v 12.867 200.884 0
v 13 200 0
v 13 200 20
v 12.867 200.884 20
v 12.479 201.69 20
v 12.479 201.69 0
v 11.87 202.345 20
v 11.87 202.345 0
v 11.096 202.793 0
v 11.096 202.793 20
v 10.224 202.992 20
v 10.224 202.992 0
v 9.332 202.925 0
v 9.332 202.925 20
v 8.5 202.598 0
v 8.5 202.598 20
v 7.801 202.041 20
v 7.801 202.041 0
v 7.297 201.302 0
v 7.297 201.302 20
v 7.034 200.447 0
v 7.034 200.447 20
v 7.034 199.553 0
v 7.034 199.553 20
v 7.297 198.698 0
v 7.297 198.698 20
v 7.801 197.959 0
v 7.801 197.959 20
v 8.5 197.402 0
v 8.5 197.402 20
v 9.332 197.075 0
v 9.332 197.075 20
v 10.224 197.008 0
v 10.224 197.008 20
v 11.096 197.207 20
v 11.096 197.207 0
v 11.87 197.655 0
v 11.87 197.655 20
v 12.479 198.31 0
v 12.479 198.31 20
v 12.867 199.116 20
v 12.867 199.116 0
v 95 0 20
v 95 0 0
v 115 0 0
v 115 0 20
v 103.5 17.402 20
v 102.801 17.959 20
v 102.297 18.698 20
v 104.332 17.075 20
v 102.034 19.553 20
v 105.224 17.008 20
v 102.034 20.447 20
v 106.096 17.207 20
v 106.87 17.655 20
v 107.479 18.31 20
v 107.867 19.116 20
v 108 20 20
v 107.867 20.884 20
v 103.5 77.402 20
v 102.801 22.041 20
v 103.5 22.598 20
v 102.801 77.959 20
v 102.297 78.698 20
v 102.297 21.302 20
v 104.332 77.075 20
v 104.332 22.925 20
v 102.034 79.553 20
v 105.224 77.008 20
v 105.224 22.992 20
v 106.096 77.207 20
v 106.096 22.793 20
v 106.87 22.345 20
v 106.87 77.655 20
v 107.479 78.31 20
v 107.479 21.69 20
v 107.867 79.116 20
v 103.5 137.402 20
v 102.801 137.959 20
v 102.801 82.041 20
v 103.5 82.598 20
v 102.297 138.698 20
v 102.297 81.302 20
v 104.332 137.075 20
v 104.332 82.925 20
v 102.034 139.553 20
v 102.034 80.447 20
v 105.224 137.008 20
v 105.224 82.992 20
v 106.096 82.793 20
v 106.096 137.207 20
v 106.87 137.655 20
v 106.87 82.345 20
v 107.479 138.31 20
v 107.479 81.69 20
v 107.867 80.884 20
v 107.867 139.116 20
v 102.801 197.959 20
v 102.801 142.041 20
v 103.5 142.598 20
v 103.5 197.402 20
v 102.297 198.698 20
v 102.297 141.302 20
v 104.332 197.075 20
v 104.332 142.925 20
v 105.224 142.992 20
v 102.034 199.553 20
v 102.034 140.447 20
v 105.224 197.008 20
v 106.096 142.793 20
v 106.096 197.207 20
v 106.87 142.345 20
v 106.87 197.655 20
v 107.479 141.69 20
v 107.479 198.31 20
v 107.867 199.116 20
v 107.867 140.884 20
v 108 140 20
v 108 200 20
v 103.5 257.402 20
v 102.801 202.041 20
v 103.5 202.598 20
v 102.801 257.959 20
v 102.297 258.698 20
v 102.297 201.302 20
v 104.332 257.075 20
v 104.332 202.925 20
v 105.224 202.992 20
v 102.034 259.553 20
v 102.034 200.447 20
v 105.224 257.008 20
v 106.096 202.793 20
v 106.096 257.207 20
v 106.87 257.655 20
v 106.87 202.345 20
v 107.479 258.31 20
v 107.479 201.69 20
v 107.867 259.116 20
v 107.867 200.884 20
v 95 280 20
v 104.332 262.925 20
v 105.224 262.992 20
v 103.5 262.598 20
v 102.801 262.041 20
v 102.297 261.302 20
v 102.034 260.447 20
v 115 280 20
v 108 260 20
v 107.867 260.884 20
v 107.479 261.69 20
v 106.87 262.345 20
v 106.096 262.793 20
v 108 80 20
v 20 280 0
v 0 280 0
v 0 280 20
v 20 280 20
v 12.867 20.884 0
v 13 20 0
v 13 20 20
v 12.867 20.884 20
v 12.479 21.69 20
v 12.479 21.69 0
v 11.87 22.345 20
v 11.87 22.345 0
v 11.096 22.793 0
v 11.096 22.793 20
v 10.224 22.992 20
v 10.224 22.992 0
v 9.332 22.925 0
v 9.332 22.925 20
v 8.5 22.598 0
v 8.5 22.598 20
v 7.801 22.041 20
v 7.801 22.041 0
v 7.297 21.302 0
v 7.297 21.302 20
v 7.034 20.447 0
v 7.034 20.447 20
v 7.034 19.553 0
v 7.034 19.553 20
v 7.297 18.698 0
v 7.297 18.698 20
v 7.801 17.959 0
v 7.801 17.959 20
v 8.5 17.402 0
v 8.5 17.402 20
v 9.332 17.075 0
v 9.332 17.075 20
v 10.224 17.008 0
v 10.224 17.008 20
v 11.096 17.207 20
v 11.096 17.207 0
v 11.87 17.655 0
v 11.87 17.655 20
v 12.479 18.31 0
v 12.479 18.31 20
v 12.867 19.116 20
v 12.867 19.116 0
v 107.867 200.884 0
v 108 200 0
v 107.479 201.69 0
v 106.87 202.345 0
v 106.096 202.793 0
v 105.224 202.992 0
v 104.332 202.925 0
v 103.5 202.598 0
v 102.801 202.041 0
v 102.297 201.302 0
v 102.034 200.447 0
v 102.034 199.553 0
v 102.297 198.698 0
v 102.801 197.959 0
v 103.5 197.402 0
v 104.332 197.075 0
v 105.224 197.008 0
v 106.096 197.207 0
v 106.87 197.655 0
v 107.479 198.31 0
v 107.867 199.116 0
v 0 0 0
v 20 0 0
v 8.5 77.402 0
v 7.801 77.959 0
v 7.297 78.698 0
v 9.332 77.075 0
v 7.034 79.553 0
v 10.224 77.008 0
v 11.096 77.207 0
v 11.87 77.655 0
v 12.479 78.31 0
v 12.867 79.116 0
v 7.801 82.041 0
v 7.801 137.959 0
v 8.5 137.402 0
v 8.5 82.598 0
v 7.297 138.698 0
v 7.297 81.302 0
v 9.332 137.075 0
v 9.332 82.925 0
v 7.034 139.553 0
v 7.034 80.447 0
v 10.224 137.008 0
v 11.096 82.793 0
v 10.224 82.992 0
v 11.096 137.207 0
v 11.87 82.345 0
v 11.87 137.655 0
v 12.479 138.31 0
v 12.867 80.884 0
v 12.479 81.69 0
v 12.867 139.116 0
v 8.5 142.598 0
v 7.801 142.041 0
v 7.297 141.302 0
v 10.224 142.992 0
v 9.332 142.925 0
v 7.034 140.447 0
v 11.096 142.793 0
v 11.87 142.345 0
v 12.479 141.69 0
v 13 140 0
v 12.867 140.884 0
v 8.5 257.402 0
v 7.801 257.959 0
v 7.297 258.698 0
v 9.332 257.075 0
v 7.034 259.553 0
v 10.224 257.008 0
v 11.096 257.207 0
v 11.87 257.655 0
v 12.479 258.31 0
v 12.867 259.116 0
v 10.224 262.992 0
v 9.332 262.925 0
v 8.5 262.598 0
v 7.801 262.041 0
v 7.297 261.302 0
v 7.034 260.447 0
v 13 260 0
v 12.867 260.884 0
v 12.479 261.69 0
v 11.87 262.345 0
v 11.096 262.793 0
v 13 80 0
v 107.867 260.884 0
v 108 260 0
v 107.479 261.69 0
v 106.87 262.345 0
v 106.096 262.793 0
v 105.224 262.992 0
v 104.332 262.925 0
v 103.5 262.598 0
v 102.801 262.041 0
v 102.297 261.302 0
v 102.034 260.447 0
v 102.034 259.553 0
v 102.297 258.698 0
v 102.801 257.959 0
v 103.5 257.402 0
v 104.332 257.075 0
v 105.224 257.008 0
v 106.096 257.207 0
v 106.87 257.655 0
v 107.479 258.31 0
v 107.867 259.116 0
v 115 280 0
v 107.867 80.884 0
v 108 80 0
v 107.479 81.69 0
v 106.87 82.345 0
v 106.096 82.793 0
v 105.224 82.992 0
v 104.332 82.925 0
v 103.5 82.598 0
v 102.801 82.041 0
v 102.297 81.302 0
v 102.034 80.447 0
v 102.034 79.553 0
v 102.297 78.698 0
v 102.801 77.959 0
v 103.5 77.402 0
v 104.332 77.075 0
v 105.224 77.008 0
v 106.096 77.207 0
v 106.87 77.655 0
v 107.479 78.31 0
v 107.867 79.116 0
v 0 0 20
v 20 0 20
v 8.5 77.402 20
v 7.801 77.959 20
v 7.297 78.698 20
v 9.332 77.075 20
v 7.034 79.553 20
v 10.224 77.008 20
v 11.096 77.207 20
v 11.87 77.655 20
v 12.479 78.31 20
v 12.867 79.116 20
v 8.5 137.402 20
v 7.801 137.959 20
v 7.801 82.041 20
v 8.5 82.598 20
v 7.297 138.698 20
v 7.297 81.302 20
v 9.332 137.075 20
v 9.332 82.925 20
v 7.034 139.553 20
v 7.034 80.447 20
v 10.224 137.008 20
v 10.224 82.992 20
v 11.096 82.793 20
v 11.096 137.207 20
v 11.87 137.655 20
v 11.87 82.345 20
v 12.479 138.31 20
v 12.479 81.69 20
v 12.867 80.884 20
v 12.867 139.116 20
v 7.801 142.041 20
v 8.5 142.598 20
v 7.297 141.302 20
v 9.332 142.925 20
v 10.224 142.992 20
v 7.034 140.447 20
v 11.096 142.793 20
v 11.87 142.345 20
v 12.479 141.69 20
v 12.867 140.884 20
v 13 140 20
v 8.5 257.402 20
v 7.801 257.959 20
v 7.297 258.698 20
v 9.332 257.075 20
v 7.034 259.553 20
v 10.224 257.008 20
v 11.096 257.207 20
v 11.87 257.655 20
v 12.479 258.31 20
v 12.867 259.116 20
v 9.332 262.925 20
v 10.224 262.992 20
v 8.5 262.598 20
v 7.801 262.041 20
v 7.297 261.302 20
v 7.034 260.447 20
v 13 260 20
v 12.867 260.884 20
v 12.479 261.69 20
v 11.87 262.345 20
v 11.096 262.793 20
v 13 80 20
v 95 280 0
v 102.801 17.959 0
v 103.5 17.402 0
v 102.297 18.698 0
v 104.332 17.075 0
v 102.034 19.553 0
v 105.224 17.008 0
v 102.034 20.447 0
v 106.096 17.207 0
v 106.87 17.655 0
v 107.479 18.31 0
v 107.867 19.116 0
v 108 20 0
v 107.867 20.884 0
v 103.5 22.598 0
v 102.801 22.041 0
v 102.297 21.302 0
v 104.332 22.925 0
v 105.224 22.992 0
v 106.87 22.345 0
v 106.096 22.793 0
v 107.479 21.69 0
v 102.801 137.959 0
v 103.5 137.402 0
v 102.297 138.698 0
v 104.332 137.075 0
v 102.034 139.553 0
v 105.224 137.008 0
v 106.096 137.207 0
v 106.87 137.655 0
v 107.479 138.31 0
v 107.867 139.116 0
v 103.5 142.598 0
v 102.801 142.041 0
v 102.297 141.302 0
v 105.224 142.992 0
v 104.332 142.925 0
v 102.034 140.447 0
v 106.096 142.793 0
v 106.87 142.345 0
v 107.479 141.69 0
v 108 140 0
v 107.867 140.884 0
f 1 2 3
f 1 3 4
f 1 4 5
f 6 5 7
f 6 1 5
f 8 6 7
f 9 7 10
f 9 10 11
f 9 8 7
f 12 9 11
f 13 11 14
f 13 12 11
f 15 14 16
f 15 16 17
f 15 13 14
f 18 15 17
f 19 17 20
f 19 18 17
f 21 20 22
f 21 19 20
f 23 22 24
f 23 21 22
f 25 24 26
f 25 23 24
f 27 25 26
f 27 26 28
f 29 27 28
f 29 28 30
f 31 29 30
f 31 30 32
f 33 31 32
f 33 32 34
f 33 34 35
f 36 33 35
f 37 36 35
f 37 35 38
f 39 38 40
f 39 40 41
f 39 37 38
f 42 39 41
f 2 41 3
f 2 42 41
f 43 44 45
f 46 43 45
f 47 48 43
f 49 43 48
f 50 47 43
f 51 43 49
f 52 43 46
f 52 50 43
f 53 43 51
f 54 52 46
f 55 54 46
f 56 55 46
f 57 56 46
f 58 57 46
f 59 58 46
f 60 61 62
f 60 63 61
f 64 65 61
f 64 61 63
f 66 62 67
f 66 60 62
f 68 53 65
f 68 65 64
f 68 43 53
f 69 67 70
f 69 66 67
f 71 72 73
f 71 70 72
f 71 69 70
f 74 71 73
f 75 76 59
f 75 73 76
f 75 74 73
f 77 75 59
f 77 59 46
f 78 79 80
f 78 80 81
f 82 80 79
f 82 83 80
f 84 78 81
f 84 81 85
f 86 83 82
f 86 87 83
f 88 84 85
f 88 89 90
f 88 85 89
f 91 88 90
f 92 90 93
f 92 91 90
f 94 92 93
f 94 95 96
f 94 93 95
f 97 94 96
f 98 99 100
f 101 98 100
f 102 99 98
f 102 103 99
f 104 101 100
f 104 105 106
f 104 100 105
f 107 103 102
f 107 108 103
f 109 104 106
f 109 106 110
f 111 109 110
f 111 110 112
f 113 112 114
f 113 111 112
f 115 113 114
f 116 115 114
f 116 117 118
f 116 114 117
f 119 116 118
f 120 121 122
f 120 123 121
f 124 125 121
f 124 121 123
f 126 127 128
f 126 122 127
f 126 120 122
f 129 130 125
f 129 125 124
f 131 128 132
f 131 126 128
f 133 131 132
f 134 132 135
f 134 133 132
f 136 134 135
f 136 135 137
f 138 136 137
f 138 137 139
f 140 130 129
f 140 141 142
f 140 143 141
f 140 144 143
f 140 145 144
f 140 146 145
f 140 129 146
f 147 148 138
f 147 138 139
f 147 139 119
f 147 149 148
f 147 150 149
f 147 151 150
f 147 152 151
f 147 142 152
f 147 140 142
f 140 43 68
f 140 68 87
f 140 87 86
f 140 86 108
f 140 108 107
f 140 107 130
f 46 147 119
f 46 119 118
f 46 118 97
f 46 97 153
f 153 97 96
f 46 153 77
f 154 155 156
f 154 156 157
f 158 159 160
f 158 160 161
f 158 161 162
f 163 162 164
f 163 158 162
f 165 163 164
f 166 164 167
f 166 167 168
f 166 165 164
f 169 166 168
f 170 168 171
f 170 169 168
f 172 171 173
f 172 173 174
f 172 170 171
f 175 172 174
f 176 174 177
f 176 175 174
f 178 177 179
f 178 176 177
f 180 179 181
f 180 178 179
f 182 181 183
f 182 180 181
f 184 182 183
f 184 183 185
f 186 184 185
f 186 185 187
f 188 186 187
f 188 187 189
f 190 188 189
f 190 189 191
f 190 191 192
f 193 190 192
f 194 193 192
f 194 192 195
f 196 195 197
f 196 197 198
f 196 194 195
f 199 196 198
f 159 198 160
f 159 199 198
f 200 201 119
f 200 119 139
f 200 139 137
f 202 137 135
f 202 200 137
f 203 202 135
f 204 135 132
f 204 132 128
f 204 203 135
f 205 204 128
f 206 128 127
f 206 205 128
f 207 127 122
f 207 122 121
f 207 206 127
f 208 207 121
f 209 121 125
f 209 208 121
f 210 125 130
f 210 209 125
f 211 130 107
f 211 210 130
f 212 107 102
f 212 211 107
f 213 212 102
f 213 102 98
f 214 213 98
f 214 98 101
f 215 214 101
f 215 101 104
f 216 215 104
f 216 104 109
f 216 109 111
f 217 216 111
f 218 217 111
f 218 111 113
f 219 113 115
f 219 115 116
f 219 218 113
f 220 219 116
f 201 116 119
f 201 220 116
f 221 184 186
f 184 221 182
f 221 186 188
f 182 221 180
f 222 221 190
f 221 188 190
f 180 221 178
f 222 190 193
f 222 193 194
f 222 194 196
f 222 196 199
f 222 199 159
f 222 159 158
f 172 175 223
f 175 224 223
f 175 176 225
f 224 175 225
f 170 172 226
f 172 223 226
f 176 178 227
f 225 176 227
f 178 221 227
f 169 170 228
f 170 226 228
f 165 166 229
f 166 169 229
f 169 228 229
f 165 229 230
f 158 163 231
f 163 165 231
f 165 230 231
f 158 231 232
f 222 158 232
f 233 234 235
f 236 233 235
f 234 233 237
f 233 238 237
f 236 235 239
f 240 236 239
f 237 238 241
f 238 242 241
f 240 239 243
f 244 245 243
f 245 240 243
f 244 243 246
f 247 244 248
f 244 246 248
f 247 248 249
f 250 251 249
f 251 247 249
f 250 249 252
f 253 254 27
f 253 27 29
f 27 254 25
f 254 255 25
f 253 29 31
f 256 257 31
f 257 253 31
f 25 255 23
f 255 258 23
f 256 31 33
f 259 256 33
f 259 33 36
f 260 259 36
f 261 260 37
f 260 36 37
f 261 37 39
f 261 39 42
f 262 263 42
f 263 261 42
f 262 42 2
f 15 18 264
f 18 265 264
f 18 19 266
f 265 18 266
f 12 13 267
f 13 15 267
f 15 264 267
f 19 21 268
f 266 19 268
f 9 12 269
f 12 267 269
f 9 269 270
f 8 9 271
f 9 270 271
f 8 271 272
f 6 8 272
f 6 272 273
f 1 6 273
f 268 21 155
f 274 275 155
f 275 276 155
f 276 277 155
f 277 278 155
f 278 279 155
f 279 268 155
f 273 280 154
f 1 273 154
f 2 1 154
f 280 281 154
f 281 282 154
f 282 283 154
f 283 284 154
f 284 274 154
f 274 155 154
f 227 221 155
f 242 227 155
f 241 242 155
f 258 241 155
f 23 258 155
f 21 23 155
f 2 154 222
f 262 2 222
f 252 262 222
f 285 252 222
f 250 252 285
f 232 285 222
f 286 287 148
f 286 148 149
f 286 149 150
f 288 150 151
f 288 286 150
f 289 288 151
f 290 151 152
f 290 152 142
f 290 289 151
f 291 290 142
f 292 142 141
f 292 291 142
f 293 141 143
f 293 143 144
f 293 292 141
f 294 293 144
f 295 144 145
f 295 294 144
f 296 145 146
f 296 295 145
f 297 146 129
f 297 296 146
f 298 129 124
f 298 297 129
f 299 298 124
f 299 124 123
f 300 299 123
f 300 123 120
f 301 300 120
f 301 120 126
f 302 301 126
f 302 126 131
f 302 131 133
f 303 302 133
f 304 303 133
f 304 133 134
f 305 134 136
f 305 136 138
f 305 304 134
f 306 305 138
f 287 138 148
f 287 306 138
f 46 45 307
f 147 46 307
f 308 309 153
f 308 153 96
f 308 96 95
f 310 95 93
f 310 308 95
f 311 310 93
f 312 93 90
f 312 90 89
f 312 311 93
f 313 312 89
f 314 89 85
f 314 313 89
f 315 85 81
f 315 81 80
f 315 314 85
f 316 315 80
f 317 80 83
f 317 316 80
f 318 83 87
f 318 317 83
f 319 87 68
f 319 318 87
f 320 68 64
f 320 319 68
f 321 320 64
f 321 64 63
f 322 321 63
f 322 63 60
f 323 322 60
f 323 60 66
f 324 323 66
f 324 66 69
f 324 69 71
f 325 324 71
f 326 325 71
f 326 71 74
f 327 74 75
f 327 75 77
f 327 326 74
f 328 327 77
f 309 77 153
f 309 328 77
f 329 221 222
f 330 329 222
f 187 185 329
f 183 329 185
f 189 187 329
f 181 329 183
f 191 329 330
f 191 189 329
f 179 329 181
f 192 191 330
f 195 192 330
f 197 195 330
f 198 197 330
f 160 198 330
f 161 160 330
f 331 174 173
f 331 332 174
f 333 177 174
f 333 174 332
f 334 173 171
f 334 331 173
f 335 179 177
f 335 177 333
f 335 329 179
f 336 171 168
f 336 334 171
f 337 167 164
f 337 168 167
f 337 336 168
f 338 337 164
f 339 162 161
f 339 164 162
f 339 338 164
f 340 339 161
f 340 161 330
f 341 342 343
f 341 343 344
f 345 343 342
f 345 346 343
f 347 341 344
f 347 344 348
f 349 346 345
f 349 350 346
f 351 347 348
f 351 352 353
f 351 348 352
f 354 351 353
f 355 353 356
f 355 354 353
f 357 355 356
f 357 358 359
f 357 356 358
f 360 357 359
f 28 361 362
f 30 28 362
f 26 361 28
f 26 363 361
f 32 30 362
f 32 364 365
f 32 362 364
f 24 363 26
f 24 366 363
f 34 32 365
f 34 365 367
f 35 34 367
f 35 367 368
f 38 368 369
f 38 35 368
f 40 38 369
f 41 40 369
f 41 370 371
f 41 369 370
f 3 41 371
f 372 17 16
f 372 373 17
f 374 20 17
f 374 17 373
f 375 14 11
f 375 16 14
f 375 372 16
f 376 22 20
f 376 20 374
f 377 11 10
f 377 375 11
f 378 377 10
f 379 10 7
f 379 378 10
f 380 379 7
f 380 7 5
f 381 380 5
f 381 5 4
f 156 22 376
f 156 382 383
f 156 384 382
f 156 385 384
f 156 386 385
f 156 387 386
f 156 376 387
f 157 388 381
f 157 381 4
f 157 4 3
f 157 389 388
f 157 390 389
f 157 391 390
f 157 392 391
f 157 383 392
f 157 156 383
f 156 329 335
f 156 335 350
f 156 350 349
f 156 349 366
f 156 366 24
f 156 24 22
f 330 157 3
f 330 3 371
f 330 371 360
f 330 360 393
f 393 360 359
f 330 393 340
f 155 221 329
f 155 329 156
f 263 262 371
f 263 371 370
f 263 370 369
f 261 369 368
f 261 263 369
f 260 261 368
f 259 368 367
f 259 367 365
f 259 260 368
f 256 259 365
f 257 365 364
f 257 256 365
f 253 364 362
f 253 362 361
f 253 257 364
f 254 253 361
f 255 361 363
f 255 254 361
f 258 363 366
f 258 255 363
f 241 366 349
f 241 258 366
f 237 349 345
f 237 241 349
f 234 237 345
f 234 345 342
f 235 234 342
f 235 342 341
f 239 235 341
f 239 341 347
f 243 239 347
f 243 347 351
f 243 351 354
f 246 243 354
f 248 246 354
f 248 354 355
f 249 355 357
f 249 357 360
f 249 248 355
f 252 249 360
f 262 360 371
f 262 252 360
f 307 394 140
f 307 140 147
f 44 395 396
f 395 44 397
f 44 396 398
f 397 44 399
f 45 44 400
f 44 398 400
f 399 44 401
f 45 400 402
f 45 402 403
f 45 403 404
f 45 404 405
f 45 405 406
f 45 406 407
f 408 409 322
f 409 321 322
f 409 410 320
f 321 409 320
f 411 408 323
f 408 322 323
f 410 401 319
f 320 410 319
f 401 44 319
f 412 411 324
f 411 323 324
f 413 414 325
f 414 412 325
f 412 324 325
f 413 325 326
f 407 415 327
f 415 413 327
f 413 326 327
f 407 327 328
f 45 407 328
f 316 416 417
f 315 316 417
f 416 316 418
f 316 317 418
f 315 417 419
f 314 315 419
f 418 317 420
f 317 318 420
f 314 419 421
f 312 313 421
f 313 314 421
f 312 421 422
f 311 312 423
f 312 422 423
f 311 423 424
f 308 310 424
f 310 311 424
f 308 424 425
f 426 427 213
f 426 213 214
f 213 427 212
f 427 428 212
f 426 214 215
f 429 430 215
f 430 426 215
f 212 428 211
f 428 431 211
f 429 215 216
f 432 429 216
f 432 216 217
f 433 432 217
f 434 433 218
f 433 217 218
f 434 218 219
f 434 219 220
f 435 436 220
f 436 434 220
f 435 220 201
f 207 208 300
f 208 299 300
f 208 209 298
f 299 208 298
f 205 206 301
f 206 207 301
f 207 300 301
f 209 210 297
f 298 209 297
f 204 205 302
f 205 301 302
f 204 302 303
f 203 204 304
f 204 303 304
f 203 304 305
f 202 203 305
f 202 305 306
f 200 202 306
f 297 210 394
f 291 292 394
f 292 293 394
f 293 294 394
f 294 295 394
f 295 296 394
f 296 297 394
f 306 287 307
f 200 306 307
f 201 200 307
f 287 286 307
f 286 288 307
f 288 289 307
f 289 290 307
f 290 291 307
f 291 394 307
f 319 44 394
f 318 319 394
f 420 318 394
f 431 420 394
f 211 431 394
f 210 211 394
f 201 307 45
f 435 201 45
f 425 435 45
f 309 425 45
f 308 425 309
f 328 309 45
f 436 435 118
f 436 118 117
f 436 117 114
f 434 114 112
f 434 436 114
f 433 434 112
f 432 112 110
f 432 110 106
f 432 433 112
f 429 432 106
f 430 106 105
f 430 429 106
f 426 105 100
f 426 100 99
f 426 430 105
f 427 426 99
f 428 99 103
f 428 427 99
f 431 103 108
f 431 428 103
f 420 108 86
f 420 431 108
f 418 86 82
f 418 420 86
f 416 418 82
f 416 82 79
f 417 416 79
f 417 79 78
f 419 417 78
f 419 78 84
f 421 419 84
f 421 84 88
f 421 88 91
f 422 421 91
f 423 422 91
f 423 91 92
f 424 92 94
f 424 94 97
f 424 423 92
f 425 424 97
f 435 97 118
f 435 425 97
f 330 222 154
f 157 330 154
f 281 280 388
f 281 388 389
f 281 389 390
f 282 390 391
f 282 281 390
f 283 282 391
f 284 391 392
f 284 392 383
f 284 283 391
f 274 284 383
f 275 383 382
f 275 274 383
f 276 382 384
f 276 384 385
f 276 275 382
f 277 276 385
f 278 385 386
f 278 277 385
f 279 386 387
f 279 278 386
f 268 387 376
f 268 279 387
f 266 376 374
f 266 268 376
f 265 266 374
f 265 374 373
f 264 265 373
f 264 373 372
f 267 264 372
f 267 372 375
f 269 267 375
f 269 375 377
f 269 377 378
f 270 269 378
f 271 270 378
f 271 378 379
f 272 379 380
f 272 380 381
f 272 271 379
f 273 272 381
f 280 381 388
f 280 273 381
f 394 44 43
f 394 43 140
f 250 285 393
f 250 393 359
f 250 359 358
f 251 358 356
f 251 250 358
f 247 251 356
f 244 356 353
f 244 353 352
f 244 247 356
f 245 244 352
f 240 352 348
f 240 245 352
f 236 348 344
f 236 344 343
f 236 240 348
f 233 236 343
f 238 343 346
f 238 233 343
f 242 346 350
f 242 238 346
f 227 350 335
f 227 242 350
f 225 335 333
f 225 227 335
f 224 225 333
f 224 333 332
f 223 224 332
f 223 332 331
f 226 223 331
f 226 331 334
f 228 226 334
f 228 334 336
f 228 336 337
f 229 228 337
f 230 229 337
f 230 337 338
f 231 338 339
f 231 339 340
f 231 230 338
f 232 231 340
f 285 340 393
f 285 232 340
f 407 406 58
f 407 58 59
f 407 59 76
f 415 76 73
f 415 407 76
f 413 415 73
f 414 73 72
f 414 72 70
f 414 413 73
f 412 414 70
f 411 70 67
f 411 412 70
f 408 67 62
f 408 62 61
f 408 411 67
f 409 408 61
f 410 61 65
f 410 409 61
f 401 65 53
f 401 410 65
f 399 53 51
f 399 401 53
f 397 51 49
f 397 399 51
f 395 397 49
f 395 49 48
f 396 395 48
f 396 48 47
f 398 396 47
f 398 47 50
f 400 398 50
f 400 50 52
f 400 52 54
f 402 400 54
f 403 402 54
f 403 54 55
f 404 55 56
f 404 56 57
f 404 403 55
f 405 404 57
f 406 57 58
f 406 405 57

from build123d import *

# Parameters (mm, degrees)
F0_W     = 20
F0_H     = 280
F0_R     = 3
F1_DEPTH = 20


with BuildPart() as f1:
    # F0 (on Top) → F1 (new body)
    with BuildSketch(Plane.XY):
        with Locations((10, 140)):
            Rectangle(F0_W, F0_H)
        with Locations((10, 20)):
            Circle(F0_R, mode=Mode.SUBTRACT)
        with Locations((10, 80)):
            Circle(F0_R, mode=Mode.SUBTRACT)
        with Locations((10, 140)):
            Circle(F0_R, mode=Mode.SUBTRACT)
        with Locations((10, 200)):
            Circle(F0_R, mode=Mode.SUBTRACT)
        with Locations((10, 260)):
            Circle(F0_R, mode=Mode.SUBTRACT)
        with Locations((105, 140)):
            Rectangle(F0_W, F0_H)
        with Locations((105, 20)):
            Circle(F0_R, mode=Mode.SUBTRACT)
        with Locations((105, 80)):
            Circle(F0_R, mode=Mode.SUBTRACT)
        with Locations((105, 140)):
            Circle(F0_R, mode=Mode.SUBTRACT)
        with Locations((105, 200)):
            Circle(F0_R, mode=Mode.SUBTRACT)
        with Locations((105, 260)):
            Circle(F0_R, mode=Mode.SUBTRACT)
    extrude(amount=F1_DEPTH)


solid = f1.part
